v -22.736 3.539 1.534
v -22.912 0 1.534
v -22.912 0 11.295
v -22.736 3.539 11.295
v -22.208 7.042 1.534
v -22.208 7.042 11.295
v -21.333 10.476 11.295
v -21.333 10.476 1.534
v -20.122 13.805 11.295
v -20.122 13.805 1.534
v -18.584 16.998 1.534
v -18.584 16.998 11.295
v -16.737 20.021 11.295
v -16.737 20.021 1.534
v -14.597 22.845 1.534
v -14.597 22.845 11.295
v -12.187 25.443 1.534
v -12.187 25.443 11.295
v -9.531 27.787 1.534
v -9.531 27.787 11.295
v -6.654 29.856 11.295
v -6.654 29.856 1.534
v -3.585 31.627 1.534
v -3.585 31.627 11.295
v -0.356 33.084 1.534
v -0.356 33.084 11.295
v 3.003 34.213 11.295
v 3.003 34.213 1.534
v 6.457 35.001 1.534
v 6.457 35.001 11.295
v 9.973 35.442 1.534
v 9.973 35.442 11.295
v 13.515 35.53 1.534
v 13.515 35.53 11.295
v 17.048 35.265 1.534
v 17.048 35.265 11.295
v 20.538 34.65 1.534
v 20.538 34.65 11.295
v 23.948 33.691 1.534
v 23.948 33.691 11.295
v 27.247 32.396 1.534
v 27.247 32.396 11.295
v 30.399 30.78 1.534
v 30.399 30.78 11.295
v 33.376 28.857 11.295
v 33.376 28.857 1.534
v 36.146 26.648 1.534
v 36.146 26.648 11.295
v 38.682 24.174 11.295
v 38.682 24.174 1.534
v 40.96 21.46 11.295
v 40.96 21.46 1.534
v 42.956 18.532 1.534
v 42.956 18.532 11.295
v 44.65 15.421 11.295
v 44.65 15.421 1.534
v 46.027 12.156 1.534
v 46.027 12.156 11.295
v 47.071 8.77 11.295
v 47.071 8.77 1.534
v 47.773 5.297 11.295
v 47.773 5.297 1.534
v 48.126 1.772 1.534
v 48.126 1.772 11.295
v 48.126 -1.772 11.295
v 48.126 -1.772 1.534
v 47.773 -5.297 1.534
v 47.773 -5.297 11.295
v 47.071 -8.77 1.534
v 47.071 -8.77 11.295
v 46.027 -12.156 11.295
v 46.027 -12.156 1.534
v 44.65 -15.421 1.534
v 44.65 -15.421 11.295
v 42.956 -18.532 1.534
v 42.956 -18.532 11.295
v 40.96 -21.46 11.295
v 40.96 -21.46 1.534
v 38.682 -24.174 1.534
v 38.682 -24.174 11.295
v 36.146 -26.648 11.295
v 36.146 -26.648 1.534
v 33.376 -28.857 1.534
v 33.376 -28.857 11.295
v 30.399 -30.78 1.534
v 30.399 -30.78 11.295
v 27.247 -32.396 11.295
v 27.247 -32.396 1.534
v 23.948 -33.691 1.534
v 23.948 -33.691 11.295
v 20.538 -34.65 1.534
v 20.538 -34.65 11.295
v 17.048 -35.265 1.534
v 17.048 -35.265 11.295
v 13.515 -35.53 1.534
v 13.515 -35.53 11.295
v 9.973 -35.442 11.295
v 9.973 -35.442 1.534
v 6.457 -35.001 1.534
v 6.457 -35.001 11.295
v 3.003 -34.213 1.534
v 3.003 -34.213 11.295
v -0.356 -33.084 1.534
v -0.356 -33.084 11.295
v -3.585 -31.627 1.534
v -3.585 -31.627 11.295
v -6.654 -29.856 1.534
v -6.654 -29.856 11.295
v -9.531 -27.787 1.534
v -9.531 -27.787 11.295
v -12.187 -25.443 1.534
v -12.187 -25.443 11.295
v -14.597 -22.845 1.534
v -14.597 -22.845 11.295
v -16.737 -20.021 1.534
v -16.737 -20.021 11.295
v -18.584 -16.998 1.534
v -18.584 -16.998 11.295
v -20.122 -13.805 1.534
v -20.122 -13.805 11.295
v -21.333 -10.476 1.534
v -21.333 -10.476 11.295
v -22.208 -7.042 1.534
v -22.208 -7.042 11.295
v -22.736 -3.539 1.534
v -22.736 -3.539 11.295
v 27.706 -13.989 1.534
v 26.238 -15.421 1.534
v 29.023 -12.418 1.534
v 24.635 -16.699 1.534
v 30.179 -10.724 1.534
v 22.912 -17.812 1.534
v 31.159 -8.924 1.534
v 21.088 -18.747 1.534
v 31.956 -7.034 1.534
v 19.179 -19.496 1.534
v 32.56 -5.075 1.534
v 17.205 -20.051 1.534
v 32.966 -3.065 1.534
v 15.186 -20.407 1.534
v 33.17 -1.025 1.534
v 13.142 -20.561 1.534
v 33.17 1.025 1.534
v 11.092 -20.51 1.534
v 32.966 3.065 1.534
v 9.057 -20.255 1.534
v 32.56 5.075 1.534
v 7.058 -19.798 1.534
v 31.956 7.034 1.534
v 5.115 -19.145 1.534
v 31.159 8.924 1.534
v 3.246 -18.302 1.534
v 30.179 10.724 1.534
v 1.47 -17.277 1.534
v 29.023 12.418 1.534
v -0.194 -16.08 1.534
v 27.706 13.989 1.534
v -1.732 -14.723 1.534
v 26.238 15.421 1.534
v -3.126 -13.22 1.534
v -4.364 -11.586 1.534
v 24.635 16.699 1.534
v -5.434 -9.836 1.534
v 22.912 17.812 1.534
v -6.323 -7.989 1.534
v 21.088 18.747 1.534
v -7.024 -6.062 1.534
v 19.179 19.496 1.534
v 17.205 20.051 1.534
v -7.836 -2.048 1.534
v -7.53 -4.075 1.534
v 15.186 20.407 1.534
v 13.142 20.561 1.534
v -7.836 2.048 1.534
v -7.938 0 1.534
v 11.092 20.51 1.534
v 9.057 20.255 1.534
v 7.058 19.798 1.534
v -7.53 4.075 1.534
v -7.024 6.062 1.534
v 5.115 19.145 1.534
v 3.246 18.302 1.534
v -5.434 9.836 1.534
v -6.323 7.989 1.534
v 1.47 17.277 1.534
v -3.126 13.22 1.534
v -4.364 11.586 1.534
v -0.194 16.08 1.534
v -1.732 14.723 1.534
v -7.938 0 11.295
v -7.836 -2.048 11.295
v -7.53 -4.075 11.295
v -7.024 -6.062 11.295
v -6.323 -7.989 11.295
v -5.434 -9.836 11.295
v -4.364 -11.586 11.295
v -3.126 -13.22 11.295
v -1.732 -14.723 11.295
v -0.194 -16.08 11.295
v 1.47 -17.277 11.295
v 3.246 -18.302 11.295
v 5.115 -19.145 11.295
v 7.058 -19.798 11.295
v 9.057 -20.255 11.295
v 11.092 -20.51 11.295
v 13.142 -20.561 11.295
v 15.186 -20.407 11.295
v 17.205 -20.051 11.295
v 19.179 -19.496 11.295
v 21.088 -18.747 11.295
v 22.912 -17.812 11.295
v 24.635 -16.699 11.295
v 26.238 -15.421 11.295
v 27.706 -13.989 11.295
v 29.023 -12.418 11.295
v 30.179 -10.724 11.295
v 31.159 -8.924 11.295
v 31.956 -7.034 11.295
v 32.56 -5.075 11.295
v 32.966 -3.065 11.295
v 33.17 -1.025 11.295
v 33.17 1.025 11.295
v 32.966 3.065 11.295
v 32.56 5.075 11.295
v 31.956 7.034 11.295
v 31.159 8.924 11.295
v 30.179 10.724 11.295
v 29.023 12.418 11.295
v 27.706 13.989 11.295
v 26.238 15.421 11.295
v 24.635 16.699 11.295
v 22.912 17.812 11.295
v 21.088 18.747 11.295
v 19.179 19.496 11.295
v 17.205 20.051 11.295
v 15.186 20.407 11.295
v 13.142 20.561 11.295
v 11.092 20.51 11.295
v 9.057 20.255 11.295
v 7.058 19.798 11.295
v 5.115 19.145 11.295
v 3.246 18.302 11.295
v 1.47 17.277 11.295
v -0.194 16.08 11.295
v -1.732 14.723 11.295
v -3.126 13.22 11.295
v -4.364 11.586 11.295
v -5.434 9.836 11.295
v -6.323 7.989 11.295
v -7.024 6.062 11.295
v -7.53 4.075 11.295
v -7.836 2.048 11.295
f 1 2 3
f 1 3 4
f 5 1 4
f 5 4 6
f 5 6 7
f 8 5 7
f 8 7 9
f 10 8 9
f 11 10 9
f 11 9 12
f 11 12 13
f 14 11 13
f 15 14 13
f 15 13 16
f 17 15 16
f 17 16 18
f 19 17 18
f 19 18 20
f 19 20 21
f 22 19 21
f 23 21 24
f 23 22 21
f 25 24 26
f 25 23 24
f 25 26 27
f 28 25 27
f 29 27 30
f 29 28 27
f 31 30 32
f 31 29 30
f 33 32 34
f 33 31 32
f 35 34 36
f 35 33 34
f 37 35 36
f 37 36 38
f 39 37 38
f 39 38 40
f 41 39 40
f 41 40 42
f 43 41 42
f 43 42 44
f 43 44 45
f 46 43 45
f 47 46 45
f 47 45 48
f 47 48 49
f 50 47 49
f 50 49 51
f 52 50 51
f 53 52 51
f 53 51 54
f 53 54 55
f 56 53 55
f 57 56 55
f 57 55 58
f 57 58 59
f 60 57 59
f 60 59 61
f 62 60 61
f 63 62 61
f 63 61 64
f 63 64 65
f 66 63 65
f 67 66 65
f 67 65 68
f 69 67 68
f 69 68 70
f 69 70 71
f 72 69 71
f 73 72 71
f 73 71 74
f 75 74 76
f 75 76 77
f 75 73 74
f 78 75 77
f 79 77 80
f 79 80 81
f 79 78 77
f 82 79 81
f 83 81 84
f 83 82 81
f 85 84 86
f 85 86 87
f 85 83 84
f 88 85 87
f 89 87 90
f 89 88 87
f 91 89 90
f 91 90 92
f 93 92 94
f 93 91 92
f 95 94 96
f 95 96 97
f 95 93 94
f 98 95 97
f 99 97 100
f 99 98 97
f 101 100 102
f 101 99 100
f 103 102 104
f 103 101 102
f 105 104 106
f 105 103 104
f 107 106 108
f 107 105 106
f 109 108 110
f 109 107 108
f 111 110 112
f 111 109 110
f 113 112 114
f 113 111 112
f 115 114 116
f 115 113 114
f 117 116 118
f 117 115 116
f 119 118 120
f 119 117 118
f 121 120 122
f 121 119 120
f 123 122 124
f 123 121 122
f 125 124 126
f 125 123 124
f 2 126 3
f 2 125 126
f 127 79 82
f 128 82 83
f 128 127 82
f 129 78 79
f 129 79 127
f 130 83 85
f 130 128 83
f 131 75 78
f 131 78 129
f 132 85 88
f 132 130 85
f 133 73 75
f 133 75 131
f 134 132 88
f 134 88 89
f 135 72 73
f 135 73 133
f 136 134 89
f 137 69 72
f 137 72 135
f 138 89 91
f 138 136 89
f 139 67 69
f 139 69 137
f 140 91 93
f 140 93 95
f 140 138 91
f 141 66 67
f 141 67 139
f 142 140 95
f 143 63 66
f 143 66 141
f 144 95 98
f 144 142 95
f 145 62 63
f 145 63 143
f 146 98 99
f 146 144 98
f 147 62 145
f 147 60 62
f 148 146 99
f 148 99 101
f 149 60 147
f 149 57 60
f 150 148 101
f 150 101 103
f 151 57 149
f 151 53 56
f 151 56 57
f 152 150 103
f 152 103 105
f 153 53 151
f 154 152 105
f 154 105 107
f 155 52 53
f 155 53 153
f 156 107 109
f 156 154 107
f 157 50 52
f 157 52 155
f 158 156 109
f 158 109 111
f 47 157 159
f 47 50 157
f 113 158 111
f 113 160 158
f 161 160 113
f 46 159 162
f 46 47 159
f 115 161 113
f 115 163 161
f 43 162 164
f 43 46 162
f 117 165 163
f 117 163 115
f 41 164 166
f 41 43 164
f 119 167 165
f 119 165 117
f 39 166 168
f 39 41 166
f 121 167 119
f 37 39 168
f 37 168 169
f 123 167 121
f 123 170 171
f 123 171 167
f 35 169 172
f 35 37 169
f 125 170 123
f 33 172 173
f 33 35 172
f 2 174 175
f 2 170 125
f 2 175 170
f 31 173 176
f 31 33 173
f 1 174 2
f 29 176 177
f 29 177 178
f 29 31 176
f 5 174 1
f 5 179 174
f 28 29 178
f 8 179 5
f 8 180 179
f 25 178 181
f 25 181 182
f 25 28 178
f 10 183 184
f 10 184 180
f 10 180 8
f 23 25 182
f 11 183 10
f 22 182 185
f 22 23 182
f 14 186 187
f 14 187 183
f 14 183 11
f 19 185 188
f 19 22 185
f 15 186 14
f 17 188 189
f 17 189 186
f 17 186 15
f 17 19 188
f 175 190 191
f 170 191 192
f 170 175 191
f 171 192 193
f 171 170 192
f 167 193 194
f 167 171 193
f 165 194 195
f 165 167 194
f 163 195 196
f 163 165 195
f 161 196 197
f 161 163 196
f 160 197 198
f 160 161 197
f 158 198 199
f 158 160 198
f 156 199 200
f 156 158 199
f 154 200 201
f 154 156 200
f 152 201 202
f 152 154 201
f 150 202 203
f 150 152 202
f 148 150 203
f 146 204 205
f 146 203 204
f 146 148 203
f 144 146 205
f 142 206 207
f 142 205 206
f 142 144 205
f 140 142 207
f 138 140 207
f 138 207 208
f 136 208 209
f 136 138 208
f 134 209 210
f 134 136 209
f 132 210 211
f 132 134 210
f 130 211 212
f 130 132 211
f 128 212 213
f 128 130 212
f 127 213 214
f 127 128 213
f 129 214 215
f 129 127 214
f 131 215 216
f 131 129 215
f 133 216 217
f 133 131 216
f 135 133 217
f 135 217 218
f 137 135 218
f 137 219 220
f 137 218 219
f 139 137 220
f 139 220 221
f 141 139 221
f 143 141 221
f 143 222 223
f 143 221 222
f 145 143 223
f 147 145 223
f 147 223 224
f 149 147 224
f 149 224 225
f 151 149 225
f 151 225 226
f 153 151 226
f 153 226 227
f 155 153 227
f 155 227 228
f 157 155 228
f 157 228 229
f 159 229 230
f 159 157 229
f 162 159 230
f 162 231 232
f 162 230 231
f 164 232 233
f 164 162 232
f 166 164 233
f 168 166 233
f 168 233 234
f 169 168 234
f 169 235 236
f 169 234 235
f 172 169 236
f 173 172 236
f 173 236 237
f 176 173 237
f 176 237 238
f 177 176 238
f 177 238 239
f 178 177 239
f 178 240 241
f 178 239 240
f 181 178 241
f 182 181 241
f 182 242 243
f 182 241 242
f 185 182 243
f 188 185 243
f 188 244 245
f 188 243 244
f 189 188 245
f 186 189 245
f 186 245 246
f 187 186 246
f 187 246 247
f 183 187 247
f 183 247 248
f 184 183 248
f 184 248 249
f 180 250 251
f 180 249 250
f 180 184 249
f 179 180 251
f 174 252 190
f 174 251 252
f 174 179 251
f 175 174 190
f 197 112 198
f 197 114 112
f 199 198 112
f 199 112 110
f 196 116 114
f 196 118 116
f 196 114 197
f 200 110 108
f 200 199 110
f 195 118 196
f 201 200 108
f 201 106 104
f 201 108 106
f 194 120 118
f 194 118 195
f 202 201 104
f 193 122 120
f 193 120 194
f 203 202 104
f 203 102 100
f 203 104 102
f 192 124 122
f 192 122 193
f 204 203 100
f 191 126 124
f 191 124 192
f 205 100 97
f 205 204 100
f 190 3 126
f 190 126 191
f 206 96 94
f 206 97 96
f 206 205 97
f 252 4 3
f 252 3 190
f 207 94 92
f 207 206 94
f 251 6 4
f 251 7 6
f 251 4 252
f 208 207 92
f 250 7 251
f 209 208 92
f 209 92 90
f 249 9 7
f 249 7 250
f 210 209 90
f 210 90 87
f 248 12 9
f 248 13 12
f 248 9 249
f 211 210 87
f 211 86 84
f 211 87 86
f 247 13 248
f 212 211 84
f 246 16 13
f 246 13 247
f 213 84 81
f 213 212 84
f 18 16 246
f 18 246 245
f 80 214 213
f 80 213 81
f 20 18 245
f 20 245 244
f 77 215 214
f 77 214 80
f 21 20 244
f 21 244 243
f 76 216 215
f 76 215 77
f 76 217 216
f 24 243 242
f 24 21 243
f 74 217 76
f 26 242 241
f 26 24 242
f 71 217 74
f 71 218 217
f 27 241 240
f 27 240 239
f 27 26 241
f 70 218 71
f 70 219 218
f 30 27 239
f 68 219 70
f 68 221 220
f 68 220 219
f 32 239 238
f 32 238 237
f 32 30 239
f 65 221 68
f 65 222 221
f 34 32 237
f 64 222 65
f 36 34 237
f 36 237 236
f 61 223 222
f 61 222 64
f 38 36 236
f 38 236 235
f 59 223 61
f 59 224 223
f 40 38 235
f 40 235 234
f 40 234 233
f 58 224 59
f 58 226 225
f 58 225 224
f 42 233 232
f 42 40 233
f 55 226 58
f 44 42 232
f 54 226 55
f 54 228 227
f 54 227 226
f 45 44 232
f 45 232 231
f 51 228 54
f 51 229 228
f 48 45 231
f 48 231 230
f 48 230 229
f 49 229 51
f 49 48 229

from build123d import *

# Parameters (mm, degrees)
F2_DEPTH = 25
F3_DEPTH = 0.2


with BuildPart() as f1:
    # F0 (on Front) → F1 (revolve)
    with BuildSketch(Plane.XZ):
        Polygon((-7.9381447285, 11.0953617841), (-22.9123719037, 11.0953617841), (-22.9123719037, 1.533505274), (-7.9381447285, 1.533505274), (12.6288654283, 1.533505274), (12.6288654283, 6.314433529), (-7.9381447285, 6.314433529), align=None)
    revolve(axis=Axis((12.6288654283, 0, 3.9239694015), (0, 0, -1)))

    # F2 (cut): a face of the model
    f2_faces = [f1.faces().sort_by_distance(p)[0] for p in [
        (12.6288654283, 0, 6.314433529),
    ]]
    extrude(f2_faces, amount=-F2_DEPTH, mode=Mode.SUBTRACT)

    # F3 (add): faces of the model
    f3_faces = [f1.faces().sort_by_distance(p)[0] for p in [
        (47.164844763, 0, 1.533505274),
        (34.2011335822, 0, 11.0953617841),
    ]]
    extrude(f3_faces, amount=-F3_DEPTH, dir=(0, 0, -1))


solid = f1.part
